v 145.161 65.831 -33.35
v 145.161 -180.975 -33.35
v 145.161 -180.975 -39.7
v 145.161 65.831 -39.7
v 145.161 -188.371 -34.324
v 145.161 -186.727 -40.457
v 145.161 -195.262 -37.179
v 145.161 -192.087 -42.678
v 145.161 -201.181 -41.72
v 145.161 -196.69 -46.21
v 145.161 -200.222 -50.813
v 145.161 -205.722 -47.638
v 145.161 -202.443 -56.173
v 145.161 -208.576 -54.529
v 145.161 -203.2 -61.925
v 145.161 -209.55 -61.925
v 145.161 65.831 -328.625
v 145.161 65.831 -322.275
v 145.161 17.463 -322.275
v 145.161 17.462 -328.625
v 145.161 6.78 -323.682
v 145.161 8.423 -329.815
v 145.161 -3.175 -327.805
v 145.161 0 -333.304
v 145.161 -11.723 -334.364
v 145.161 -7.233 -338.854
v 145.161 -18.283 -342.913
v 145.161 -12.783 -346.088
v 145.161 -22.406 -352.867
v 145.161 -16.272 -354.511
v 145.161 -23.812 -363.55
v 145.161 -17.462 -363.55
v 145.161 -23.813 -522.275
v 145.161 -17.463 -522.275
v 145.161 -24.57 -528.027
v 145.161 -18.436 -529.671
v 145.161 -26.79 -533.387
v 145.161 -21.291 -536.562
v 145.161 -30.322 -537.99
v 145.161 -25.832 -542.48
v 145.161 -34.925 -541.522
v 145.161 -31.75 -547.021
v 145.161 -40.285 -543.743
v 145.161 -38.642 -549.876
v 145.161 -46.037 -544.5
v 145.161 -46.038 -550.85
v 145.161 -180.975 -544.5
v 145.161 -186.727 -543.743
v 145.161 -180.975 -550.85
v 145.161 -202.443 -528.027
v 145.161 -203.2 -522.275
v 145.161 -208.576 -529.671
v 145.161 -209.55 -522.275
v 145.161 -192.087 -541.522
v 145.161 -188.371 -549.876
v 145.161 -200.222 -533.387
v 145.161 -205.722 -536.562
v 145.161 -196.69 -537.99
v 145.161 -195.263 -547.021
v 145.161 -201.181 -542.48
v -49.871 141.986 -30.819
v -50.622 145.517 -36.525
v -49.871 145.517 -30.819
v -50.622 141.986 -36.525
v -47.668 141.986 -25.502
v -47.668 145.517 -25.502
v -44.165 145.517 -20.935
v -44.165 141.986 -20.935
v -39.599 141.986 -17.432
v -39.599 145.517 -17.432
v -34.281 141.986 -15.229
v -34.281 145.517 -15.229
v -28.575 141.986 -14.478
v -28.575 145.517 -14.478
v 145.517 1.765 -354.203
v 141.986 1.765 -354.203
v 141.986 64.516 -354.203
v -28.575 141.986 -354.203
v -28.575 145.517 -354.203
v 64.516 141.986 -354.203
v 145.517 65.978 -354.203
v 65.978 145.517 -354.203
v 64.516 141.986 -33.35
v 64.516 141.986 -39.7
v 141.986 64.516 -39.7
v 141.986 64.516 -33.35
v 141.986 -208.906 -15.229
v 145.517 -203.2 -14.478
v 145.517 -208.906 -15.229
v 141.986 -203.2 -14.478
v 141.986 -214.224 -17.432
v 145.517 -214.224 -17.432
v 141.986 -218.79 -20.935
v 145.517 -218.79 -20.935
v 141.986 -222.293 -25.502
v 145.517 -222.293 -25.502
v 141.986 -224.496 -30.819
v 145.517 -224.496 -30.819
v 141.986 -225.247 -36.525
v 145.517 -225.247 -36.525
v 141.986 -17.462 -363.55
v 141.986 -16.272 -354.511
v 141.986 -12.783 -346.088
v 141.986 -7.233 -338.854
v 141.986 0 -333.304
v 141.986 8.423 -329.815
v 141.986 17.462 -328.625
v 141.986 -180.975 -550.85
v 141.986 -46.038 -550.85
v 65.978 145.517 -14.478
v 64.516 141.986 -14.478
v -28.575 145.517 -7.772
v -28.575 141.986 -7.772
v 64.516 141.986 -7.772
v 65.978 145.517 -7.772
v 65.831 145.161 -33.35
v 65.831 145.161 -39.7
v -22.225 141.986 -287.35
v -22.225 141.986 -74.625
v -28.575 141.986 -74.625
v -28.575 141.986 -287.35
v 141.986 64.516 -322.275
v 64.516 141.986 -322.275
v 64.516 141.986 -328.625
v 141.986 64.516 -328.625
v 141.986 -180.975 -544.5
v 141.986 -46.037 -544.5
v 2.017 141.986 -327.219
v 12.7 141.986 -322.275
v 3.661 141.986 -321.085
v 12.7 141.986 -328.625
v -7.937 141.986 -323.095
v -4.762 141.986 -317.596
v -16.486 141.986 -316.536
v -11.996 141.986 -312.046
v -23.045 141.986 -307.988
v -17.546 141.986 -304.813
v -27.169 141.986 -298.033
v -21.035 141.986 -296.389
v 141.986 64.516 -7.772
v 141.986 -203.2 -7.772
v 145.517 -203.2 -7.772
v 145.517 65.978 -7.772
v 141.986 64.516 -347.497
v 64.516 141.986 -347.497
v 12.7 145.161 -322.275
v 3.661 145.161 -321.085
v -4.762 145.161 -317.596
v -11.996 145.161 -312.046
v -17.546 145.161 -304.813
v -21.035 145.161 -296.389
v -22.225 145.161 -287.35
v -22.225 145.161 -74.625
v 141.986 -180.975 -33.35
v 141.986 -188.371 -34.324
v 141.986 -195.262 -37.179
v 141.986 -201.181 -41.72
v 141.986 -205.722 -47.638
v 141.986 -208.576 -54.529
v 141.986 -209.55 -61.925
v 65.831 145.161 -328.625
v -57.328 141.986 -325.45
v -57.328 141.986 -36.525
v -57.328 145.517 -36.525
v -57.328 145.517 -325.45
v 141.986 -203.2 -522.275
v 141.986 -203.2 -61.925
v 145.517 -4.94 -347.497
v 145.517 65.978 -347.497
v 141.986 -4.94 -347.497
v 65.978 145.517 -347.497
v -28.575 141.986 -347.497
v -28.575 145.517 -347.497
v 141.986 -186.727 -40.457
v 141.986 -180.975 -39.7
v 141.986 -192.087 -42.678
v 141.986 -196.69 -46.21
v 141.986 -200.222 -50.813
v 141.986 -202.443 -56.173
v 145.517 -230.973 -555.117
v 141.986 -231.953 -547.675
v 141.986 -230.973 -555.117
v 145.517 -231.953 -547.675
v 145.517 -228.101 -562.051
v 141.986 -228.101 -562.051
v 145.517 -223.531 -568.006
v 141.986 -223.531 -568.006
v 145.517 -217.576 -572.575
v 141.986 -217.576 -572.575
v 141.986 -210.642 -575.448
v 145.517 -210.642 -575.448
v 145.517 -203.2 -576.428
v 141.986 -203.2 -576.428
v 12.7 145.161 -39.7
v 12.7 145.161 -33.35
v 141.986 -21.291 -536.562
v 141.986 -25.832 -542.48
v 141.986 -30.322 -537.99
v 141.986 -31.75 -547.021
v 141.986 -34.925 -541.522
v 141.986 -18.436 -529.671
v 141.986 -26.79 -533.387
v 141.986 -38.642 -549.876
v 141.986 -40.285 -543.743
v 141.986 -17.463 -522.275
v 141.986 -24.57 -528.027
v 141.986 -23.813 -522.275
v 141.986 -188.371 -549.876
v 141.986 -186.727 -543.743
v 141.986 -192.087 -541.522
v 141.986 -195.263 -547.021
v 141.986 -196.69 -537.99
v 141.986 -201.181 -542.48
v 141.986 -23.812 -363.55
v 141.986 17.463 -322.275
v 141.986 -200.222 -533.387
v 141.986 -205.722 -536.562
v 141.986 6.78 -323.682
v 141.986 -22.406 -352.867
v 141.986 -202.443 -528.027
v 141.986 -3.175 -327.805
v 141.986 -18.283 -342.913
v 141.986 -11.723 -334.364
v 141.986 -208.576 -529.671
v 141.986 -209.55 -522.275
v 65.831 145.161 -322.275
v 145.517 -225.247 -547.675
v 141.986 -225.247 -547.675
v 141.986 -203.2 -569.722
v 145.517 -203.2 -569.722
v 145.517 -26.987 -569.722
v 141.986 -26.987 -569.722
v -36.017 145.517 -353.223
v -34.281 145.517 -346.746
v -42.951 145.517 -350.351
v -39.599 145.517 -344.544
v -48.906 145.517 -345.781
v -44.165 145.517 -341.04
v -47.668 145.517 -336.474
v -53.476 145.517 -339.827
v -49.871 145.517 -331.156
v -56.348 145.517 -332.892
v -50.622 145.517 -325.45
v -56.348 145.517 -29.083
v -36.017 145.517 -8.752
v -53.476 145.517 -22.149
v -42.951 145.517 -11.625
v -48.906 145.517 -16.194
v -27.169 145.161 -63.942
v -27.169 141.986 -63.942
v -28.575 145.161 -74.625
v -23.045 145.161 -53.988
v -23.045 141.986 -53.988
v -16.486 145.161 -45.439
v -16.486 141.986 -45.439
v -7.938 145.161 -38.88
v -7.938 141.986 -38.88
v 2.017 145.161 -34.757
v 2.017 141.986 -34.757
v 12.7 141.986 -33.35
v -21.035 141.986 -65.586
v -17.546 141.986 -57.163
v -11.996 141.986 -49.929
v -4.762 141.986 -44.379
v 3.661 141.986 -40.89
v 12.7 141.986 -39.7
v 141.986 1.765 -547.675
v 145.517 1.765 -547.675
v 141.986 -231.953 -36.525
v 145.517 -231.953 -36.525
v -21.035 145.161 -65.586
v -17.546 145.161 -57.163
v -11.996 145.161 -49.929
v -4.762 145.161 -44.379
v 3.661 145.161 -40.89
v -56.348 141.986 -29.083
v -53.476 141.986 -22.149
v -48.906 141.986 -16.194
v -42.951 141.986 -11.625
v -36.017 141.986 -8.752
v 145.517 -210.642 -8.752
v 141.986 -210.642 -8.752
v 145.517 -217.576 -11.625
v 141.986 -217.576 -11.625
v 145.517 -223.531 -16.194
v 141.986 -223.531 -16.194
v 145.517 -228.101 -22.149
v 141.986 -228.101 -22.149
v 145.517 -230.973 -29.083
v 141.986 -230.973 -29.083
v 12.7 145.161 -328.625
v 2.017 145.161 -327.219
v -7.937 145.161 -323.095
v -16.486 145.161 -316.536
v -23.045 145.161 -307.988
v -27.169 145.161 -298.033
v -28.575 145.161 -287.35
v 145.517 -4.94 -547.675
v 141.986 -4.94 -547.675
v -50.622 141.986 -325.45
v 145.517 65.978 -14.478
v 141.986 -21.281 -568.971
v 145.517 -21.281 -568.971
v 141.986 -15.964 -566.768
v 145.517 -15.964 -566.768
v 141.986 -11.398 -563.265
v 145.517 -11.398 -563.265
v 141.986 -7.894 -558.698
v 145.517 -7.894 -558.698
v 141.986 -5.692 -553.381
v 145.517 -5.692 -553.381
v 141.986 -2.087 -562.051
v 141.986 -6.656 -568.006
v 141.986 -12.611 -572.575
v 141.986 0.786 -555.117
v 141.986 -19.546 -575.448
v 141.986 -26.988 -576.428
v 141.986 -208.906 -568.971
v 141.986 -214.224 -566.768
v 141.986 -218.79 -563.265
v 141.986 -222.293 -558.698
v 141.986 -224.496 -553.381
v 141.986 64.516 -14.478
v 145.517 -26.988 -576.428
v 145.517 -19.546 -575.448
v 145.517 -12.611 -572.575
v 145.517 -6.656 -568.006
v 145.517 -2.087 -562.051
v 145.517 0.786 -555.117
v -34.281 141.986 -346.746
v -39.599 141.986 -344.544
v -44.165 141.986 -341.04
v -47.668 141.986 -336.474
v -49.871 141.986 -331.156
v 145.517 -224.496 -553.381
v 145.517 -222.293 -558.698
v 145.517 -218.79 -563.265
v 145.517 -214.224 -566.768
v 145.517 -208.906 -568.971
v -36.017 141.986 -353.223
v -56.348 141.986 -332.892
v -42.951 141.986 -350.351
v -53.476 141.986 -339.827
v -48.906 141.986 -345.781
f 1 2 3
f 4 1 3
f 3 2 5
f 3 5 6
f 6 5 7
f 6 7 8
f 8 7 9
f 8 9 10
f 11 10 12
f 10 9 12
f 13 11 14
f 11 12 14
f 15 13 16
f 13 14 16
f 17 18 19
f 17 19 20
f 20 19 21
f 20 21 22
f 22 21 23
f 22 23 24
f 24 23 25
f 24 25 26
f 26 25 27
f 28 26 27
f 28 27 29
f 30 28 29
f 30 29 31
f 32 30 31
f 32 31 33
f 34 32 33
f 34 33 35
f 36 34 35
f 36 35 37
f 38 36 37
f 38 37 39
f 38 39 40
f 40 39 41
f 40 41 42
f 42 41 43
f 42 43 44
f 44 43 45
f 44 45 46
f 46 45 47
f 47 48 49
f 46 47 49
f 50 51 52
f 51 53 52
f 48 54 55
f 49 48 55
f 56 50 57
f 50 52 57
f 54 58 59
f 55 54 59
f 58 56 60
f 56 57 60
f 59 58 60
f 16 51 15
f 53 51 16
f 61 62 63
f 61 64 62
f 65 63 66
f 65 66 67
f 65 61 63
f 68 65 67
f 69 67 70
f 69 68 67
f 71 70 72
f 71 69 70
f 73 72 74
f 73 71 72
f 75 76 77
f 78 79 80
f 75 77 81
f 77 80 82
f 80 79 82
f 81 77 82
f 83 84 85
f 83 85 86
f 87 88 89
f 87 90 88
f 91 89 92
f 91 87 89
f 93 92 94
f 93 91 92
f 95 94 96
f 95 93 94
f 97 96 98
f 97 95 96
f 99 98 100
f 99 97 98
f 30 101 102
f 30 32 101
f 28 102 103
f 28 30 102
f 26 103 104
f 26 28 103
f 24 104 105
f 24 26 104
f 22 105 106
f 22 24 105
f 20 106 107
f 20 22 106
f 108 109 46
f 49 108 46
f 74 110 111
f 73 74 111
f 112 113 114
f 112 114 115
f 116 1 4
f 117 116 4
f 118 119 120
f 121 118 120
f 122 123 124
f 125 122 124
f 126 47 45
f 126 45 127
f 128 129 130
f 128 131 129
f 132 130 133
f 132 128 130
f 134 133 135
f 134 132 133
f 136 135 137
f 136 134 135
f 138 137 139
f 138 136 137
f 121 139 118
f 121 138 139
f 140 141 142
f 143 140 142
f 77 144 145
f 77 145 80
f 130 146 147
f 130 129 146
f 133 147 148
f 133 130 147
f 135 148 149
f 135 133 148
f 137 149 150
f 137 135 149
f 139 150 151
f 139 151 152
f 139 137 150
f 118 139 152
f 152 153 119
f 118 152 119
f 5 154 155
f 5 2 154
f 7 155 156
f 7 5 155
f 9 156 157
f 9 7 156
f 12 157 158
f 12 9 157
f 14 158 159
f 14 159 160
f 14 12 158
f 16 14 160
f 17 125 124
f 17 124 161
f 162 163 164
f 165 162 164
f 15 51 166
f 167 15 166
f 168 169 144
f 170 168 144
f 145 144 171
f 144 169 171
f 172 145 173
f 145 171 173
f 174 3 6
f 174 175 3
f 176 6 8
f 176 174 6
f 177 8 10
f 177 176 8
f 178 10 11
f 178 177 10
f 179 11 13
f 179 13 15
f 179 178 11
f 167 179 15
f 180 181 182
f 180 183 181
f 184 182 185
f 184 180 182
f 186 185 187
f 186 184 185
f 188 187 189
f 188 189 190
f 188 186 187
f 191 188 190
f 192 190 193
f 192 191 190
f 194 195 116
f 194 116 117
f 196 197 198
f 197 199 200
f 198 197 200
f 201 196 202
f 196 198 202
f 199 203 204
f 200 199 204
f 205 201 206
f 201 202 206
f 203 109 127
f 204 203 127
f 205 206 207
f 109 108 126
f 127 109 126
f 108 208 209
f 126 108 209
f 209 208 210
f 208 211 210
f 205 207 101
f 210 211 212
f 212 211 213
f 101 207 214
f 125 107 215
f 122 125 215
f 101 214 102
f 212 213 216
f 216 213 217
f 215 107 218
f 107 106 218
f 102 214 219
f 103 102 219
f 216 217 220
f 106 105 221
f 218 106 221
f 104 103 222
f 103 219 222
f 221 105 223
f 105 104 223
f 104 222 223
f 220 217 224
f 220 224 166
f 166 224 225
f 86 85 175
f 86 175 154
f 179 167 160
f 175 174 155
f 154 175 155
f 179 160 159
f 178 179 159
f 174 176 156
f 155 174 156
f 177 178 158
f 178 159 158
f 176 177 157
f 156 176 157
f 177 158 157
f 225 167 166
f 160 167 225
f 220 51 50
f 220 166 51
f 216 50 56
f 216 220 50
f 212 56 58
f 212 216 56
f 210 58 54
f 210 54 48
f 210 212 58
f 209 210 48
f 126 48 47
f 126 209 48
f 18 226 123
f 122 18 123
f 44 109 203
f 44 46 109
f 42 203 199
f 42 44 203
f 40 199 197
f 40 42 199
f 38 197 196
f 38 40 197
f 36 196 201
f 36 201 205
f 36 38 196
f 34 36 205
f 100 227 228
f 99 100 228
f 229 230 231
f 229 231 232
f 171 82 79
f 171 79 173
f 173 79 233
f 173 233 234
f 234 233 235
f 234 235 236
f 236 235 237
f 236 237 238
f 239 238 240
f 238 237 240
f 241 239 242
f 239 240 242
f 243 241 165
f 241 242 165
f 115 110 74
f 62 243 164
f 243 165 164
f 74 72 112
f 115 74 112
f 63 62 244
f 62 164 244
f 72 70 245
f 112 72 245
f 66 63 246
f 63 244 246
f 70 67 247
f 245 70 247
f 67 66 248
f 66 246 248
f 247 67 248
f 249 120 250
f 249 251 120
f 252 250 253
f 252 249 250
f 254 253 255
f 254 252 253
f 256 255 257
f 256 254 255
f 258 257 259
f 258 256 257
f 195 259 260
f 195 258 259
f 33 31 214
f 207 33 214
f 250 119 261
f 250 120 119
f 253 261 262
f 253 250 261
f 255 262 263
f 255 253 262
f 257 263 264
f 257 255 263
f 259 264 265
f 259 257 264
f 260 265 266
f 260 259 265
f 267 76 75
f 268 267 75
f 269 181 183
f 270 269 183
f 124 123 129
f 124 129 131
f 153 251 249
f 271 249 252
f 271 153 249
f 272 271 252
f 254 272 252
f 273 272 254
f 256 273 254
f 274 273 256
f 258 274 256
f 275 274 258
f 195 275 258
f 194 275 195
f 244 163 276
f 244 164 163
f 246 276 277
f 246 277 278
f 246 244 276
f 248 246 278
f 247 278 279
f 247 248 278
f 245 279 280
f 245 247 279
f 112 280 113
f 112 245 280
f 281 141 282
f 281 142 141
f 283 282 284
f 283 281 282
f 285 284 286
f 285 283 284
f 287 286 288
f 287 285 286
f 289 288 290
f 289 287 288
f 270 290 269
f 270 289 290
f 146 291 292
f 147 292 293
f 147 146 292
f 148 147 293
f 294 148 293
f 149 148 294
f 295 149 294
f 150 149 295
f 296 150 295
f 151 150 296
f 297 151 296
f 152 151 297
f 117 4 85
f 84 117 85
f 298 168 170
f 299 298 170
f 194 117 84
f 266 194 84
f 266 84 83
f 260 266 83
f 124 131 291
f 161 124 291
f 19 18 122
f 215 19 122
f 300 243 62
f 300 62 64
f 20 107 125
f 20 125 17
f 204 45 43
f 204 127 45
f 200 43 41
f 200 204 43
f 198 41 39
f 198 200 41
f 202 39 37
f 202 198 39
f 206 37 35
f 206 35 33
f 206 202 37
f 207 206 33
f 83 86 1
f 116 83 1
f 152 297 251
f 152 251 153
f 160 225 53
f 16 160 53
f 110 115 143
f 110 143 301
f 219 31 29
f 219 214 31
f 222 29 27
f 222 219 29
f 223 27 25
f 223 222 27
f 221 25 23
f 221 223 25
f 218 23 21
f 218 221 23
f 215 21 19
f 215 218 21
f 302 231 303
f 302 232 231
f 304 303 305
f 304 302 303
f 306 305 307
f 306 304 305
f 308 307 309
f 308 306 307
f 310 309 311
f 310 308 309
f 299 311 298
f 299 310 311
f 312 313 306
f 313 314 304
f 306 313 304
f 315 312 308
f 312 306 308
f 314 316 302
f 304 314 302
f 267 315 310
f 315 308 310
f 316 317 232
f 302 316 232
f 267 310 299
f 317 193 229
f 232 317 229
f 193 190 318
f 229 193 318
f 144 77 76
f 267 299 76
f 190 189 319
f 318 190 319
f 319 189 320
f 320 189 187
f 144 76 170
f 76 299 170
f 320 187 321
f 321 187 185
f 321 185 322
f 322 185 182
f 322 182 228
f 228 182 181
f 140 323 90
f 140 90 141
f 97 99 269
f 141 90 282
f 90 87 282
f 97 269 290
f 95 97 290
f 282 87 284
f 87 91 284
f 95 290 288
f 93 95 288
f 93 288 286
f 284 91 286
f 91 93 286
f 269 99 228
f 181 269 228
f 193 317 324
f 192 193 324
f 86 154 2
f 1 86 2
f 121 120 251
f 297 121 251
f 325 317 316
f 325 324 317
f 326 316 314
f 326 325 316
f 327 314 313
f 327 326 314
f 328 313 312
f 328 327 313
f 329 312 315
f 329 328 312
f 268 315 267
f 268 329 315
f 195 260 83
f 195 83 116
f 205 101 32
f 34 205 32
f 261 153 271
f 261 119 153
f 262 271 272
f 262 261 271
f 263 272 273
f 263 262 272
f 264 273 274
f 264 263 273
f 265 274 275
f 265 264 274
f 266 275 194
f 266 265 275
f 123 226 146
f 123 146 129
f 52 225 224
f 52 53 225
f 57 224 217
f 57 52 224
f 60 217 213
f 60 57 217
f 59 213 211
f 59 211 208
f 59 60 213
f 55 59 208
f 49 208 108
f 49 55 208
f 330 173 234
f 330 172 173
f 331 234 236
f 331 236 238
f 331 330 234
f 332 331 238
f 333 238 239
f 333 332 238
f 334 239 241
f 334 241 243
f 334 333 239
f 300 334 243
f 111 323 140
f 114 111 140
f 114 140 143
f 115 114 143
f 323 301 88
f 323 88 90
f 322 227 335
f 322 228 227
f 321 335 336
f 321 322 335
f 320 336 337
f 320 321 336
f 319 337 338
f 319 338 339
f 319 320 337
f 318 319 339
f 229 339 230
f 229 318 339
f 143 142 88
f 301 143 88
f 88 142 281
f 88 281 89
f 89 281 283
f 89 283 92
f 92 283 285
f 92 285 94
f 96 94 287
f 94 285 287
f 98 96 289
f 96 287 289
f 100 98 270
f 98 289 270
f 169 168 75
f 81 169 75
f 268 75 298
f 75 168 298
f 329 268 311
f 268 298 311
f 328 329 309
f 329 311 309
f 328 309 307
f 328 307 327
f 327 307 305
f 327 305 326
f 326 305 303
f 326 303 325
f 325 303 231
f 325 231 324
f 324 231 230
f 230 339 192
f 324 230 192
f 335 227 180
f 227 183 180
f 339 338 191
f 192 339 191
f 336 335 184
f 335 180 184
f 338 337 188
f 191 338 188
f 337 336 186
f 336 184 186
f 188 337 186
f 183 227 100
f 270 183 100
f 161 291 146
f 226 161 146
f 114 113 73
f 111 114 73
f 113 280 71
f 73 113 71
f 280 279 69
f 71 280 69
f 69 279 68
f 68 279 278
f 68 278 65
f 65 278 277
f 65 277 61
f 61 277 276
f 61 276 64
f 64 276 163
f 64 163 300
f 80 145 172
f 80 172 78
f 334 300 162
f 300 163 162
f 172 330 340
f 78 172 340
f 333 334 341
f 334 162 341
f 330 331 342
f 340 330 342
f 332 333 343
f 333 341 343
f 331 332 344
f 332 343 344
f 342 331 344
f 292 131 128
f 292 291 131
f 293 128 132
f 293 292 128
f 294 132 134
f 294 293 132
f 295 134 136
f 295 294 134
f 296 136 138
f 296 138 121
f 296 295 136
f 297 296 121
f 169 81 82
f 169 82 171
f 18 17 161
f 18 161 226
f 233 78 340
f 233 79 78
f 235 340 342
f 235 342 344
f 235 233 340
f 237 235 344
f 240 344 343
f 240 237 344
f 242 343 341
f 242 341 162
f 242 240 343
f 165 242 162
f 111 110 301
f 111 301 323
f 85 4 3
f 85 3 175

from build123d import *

# Parameters (mm, degrees)
SKETCH4_W = 6.7056
SKETCH4_H = 3.5306
SKETCH5_W = 3.175
SKETCH5_H = 6.35


with BuildPart() as part:
    # Sweep1: sweep along a curve in space
    with BuildLine() as sweep1_path:
        Line((141.986, 64.516, -11.1252), (141.986, -203.2, -11.1252))
        ThreePointArc((141.986, -203.2, -11.1252), (141.986, -221.160512242, -18.564687758), (141.986, -228.6, -36.5252))
        Line((141.986, -228.6, -36.5252), (141.986, -228.6, -547.6748))
        ThreePointArc((141.986, -228.6, -547.6748), (141.986, -221.160512242, -565.635312242), (141.986, -203.2, -573.0748))
        Line((141.986, -203.2, -573.0748), (141.986, -26.9875, -573.0748))
        ThreePointArc((141.986, -26.9875, -573.0748), (141.986, -9.026987758, -565.635312242), (141.986, -1.5875, -547.6748))
        Line((141.986, -1.5875, -547.6748), (141.986, -1.5875, -350.8502))
        Line((141.986, -1.5875, -350.8502), (141.986, 64.516, -350.8502))
        Line((64.516, 141.986, -350.8502), (141.986, 64.516, -350.8502))
        Line((-28.575, 141.986, -350.8502), (64.516, 141.986, -350.8502))
        ThreePointArc((-53.975, 141.986, -325.4502), (-46.535512242, 141.986, -343.410712242), (-28.575, 141.986, -350.8502))
        Line((-53.975, 141.986, -36.5252), (-53.975, 141.986, -325.4502))
        ThreePointArc((-28.575, 141.986, -11.1252), (-46.535512242, 141.986, -18.564687758), (-53.975, 141.986, -36.5252))
        Line((64.516, 141.986, -11.1252), (-28.575, 141.986, -11.1252))
        Line((64.516, 141.986, -11.1252), (141.986, 64.516, -11.1252))
    # Sketch4 → Sweep1 (sweep)
    with BuildSketch(Plane(origin=(0, 0, 0), x_dir=(0, 0, -1), z_dir=(0, 1, 0))):
        with Locations((11.1252, -143.7513)):
            Rectangle(SKETCH4_W, SKETCH4_H)
    sweep(path=sweep1_path.line, transition=Transition.RIGHT)


with BuildPart() as body_2:
    # Sweep2: sweep along a curve in space
    with BuildLine() as sweep2_path:
        Line((141.986, 64.516, -36.5252), (141.986, -180.975, -36.5252))
        ThreePointArc((141.986, -180.975, -36.5252), (141.986, -198.935512242, -43.964687758), (141.986, -206.375, -61.9252))
        Line((141.986, -206.375, -61.9252), (141.986, -206.375, -522.2748))
        ThreePointArc((141.986, -206.375, -522.2748), (141.986, -198.935512242, -540.235312242), (141.986, -180.975, -547.6748))
        Line((141.986, -180.975, -547.6748), (141.986, -46.0375, -547.6748))
        ThreePointArc((141.986, -46.0375, -547.6748), (141.986, -28.076987758, -540.235312242), (141.986, -20.6375, -522.2748))
        Line((141.986, -20.6375, -522.2748), (141.986, -20.6375, -363.5502))
        ThreePointArc((141.986, -20.6375, -363.5502), (141.986, -9.478268363, -336.609431637), (141.986, 17.4625, -325.4502))
        Line((141.986, 64.516, -325.4502), (141.986, 17.4625, -325.4502))
        Line((64.516, 141.986, -325.4502), (141.986, 64.516, -325.4502))
        Line((12.7, 141.986, -325.4502), (64.516, 141.986, -325.4502))
        ThreePointArc((-25.4, 141.986, -287.3502), (-14.240768363, 141.986, -314.290968363), (12.7, 141.986, -325.4502))
        Line((-25.4, 141.986, -74.6252), (-25.4, 141.986, -287.3502))
        ThreePointArc((12.7, 141.986, -36.5252), (-14.240768363, 141.986, -47.684431637), (-25.4, 141.986, -74.6252))
        Line((64.516, 141.986, -36.5252), (12.7, 141.986, -36.5252))
        Line((64.516, 141.986, -36.5252), (141.986, 64.516, -36.5252))
    # Sketch5 → Sweep2 (sweep)
    with BuildSketch(Plane(origin=(0, 0, 0), x_dir=(1, 0, 0), z_dir=(0, 1, 0))):
        with Locations((143.5735, 36.5252)):
            Rectangle(SKETCH5_W, SKETCH5_H)
    sweep(path=sweep2_path.line, transition=Transition.RIGHT)


solid = Compound([part.part, body_2.part])
